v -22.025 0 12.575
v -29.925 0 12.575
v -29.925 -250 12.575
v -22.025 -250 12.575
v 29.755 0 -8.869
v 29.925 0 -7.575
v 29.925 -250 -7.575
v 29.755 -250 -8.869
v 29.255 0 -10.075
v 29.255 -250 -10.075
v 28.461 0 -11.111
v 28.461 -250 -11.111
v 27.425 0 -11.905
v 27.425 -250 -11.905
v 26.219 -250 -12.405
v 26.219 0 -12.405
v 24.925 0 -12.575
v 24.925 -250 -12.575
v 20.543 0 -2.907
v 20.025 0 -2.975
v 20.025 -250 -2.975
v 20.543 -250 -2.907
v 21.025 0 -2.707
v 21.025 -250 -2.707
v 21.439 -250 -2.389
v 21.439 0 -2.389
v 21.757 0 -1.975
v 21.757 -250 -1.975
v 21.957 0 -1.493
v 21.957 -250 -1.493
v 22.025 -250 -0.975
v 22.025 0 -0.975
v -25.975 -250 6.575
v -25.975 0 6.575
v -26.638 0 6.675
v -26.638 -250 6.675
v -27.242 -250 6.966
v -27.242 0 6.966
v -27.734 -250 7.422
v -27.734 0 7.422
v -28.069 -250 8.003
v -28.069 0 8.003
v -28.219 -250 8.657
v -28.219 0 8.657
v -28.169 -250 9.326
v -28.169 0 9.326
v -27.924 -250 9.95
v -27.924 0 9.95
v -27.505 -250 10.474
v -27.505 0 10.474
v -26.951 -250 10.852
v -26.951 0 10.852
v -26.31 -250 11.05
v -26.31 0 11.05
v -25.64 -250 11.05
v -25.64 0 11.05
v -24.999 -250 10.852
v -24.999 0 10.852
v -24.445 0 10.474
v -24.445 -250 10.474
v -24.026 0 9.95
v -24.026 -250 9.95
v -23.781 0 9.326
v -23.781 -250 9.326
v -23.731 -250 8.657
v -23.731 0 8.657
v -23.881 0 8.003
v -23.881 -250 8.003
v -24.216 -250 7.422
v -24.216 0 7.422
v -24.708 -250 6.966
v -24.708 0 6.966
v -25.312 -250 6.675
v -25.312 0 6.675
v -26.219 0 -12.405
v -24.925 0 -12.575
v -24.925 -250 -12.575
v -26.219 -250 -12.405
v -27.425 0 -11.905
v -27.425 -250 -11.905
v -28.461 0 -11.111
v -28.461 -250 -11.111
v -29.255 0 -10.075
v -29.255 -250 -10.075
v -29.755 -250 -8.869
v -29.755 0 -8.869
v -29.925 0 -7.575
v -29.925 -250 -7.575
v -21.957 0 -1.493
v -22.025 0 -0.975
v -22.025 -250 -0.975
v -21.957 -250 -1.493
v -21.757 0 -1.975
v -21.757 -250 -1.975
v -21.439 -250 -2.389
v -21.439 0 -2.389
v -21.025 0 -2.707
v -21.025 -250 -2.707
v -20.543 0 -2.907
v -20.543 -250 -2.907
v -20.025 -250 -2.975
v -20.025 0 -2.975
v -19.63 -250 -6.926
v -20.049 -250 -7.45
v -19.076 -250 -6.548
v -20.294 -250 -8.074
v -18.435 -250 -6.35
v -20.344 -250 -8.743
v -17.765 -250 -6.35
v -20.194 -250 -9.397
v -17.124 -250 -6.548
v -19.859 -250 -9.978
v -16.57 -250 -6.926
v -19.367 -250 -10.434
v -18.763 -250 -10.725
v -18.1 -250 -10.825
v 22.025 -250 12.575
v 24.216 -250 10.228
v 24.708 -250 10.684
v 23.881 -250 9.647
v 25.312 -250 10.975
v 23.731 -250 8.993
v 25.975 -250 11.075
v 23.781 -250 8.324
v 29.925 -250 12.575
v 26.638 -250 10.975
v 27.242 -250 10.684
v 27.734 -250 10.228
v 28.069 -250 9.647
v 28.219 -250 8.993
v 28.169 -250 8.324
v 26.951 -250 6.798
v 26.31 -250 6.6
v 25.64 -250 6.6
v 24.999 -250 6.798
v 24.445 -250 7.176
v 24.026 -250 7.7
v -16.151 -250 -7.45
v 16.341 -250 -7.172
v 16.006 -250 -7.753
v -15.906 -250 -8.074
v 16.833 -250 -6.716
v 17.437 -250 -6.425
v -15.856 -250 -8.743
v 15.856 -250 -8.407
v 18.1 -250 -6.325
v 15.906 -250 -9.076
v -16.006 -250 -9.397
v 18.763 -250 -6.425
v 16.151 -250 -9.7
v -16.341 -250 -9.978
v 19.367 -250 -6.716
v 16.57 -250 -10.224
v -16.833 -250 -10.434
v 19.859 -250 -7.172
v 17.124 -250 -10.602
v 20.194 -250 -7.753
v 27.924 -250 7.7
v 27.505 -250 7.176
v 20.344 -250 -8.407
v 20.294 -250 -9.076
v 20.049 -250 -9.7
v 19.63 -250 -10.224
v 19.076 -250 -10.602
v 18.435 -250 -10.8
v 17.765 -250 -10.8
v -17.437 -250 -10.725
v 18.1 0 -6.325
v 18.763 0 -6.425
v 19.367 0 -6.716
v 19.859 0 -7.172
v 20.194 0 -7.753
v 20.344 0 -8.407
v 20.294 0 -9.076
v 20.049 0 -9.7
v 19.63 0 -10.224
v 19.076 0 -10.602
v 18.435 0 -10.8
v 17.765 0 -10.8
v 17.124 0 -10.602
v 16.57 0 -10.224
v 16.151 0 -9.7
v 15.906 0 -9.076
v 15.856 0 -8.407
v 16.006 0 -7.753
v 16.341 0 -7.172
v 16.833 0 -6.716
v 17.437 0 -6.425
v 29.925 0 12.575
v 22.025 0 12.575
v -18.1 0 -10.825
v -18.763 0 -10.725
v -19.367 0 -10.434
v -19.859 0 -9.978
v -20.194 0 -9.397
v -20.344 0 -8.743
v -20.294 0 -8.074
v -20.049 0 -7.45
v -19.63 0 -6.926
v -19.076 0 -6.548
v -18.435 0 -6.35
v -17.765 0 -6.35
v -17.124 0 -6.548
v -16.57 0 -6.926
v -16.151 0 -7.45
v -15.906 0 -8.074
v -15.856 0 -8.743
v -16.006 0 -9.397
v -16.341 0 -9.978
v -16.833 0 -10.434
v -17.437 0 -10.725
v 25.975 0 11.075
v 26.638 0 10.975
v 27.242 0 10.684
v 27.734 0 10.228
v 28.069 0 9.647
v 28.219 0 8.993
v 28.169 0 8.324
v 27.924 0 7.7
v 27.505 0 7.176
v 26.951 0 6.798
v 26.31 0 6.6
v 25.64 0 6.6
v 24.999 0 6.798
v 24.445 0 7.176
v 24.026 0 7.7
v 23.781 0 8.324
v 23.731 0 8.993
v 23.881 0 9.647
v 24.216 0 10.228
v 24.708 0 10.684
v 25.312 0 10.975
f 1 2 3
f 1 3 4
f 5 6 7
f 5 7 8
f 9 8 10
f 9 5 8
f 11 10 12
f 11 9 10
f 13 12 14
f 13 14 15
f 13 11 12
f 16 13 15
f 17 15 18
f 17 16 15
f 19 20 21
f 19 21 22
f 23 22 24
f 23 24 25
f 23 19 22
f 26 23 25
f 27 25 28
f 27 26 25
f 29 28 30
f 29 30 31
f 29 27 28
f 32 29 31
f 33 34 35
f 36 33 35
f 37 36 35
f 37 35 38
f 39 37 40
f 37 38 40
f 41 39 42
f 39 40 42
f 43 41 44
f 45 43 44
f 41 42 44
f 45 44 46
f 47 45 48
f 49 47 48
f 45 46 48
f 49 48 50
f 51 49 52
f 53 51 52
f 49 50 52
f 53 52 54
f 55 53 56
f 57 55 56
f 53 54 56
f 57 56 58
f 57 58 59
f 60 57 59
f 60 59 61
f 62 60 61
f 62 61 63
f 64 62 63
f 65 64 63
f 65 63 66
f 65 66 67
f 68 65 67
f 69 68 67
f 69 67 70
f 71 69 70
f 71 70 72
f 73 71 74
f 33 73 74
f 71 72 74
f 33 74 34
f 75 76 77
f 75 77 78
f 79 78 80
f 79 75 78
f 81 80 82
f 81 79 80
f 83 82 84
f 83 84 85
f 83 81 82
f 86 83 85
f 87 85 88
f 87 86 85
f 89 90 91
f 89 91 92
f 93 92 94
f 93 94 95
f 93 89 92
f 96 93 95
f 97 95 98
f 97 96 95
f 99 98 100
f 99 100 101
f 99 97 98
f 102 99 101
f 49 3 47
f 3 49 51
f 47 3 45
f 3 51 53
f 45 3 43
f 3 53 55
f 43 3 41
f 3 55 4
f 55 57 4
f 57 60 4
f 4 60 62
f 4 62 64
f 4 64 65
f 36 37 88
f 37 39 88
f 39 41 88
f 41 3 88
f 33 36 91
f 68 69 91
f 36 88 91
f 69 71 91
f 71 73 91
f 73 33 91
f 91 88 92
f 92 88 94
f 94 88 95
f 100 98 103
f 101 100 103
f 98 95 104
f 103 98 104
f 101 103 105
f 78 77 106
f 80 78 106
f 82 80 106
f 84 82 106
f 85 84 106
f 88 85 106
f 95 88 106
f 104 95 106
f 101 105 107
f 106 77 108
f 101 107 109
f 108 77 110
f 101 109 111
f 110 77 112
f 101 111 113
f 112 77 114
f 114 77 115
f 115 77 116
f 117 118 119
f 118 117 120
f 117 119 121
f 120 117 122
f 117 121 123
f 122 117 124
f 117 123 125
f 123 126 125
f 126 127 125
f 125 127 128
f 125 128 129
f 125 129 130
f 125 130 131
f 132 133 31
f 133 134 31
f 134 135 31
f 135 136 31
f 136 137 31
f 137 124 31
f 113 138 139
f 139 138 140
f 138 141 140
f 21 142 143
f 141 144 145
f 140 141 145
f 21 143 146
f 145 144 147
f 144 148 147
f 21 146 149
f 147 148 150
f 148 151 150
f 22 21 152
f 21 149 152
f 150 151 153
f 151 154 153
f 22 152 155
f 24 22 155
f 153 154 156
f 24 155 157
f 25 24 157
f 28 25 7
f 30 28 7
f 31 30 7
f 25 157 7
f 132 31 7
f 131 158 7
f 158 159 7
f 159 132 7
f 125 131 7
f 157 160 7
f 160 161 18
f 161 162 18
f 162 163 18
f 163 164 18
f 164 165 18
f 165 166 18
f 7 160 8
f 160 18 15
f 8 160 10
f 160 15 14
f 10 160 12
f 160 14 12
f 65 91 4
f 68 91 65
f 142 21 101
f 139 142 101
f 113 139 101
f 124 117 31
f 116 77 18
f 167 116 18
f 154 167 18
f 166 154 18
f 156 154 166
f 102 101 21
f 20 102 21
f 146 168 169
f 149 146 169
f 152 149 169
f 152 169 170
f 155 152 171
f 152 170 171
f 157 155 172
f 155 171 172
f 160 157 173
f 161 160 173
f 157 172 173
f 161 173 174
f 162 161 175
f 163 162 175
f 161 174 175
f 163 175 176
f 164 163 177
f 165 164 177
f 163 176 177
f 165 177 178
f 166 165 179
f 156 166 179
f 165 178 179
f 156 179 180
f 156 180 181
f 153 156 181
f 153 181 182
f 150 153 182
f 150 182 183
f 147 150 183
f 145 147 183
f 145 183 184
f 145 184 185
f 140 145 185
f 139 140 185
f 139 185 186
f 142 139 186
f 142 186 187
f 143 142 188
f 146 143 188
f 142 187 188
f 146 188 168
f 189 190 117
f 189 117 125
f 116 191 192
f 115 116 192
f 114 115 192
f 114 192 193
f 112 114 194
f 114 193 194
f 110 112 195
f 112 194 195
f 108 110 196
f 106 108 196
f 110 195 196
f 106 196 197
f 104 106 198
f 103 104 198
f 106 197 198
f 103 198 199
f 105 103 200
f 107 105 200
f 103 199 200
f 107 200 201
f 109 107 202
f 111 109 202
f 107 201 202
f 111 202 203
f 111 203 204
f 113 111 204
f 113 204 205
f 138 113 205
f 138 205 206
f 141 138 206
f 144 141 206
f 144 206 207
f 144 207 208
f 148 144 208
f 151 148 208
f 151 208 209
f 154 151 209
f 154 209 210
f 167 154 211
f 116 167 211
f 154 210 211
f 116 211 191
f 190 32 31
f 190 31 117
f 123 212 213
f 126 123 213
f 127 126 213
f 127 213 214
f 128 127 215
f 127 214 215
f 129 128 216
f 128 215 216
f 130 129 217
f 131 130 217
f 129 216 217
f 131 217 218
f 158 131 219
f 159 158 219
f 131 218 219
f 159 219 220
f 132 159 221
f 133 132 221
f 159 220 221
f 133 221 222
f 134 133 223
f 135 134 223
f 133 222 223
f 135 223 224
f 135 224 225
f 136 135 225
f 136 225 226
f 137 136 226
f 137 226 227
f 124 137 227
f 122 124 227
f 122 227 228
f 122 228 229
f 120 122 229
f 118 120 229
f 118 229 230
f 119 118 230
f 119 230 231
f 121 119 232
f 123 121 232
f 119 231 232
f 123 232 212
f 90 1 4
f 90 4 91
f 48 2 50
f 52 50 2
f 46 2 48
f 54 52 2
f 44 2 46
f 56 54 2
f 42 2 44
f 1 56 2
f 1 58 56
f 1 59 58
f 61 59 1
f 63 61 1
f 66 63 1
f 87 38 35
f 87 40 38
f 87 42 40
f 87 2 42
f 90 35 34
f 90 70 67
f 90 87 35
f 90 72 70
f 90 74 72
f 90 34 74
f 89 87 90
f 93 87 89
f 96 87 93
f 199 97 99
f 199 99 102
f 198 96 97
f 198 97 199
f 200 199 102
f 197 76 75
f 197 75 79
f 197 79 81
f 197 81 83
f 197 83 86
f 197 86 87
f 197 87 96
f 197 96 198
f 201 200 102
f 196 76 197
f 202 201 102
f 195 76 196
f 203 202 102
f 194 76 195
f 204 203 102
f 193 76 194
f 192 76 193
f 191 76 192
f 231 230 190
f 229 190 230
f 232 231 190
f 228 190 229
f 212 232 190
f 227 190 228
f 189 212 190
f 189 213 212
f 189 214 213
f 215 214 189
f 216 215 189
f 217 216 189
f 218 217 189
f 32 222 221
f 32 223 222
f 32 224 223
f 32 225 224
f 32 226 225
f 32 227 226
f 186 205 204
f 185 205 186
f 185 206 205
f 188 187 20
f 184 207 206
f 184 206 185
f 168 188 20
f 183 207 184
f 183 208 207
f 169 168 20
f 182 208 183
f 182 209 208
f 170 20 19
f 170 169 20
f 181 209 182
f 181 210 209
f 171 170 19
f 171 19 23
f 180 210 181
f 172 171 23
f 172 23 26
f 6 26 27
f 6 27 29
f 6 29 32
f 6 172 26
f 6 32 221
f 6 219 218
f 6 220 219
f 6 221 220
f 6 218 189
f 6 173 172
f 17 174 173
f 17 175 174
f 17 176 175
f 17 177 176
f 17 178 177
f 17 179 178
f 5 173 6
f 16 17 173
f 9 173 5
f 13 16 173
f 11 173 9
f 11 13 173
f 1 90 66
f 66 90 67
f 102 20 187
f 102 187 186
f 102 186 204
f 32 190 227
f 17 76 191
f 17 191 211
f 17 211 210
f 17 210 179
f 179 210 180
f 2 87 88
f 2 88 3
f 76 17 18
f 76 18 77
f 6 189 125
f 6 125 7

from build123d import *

# Parameters (mm, degrees)
SKETCH2_R           = 2.25
BOSS_EXTRUDE1_DEPTH = 250


with BuildPart() as part:
    # Sketch2 → Boss-Extrude1 (new body)
    with BuildSketch(Plane(origin=(0, 0, 0), x_dir=(1, 0, 0), z_dir=(0, 1, 0))):
        with BuildLine():
            Line((-22.025, -12.575), (-22.025, 0.975))
            ThreePointArc((-22.025, 0.975), (-21.439213562, 2.389213562), (-20.025, 2.975))
            Line((-20.025, 2.975), (20.025, 2.975))
            ThreePointArc((20.025, 2.975), (21.439213562, 2.389213562), (22.025, 0.975))
            Line((22.025, 0.975), (22.025, -12.575))
            Line((22.025, -12.575), (29.925, -12.575))
            Line((29.925, -12.575), (29.925, 7.575))
            ThreePointArc((29.925, 7.575), (28.460533906, 11.110533906), (24.925, 12.575))
            Line((24.925, 12.575), (-24.925, 12.575))
            ThreePointArc((-24.925, 12.575), (-28.460533906, 11.110533906), (-29.925, 7.575))
            Line((-29.925, 7.575), (-29.925, -12.575))
            Line((-29.925, -12.575), (-22.025, -12.575))
        make_face()
        with Locations(Location((18.1, 8.575, 0), (0, 0, 270))):
            Circle(SKETCH2_R, mode=Mode.SUBTRACT)
        with Locations(Location((25.975, -8.825, 0), (0, 0, 270))):
            Circle(SKETCH2_R, mode=Mode.SUBTRACT)
        with Locations(Location((-25.975, -8.825, 0), (0, 0, 90))):
            Circle(SKETCH2_R, mode=Mode.SUBTRACT)
        with Locations(Location((-18.1, 8.575, 0), (0, 0, 90))):
            Circle(SKETCH2_R, mode=Mode.SUBTRACT)
    extrude(amount=-BOSS_EXTRUDE1_DEPTH)


solid = part.part
